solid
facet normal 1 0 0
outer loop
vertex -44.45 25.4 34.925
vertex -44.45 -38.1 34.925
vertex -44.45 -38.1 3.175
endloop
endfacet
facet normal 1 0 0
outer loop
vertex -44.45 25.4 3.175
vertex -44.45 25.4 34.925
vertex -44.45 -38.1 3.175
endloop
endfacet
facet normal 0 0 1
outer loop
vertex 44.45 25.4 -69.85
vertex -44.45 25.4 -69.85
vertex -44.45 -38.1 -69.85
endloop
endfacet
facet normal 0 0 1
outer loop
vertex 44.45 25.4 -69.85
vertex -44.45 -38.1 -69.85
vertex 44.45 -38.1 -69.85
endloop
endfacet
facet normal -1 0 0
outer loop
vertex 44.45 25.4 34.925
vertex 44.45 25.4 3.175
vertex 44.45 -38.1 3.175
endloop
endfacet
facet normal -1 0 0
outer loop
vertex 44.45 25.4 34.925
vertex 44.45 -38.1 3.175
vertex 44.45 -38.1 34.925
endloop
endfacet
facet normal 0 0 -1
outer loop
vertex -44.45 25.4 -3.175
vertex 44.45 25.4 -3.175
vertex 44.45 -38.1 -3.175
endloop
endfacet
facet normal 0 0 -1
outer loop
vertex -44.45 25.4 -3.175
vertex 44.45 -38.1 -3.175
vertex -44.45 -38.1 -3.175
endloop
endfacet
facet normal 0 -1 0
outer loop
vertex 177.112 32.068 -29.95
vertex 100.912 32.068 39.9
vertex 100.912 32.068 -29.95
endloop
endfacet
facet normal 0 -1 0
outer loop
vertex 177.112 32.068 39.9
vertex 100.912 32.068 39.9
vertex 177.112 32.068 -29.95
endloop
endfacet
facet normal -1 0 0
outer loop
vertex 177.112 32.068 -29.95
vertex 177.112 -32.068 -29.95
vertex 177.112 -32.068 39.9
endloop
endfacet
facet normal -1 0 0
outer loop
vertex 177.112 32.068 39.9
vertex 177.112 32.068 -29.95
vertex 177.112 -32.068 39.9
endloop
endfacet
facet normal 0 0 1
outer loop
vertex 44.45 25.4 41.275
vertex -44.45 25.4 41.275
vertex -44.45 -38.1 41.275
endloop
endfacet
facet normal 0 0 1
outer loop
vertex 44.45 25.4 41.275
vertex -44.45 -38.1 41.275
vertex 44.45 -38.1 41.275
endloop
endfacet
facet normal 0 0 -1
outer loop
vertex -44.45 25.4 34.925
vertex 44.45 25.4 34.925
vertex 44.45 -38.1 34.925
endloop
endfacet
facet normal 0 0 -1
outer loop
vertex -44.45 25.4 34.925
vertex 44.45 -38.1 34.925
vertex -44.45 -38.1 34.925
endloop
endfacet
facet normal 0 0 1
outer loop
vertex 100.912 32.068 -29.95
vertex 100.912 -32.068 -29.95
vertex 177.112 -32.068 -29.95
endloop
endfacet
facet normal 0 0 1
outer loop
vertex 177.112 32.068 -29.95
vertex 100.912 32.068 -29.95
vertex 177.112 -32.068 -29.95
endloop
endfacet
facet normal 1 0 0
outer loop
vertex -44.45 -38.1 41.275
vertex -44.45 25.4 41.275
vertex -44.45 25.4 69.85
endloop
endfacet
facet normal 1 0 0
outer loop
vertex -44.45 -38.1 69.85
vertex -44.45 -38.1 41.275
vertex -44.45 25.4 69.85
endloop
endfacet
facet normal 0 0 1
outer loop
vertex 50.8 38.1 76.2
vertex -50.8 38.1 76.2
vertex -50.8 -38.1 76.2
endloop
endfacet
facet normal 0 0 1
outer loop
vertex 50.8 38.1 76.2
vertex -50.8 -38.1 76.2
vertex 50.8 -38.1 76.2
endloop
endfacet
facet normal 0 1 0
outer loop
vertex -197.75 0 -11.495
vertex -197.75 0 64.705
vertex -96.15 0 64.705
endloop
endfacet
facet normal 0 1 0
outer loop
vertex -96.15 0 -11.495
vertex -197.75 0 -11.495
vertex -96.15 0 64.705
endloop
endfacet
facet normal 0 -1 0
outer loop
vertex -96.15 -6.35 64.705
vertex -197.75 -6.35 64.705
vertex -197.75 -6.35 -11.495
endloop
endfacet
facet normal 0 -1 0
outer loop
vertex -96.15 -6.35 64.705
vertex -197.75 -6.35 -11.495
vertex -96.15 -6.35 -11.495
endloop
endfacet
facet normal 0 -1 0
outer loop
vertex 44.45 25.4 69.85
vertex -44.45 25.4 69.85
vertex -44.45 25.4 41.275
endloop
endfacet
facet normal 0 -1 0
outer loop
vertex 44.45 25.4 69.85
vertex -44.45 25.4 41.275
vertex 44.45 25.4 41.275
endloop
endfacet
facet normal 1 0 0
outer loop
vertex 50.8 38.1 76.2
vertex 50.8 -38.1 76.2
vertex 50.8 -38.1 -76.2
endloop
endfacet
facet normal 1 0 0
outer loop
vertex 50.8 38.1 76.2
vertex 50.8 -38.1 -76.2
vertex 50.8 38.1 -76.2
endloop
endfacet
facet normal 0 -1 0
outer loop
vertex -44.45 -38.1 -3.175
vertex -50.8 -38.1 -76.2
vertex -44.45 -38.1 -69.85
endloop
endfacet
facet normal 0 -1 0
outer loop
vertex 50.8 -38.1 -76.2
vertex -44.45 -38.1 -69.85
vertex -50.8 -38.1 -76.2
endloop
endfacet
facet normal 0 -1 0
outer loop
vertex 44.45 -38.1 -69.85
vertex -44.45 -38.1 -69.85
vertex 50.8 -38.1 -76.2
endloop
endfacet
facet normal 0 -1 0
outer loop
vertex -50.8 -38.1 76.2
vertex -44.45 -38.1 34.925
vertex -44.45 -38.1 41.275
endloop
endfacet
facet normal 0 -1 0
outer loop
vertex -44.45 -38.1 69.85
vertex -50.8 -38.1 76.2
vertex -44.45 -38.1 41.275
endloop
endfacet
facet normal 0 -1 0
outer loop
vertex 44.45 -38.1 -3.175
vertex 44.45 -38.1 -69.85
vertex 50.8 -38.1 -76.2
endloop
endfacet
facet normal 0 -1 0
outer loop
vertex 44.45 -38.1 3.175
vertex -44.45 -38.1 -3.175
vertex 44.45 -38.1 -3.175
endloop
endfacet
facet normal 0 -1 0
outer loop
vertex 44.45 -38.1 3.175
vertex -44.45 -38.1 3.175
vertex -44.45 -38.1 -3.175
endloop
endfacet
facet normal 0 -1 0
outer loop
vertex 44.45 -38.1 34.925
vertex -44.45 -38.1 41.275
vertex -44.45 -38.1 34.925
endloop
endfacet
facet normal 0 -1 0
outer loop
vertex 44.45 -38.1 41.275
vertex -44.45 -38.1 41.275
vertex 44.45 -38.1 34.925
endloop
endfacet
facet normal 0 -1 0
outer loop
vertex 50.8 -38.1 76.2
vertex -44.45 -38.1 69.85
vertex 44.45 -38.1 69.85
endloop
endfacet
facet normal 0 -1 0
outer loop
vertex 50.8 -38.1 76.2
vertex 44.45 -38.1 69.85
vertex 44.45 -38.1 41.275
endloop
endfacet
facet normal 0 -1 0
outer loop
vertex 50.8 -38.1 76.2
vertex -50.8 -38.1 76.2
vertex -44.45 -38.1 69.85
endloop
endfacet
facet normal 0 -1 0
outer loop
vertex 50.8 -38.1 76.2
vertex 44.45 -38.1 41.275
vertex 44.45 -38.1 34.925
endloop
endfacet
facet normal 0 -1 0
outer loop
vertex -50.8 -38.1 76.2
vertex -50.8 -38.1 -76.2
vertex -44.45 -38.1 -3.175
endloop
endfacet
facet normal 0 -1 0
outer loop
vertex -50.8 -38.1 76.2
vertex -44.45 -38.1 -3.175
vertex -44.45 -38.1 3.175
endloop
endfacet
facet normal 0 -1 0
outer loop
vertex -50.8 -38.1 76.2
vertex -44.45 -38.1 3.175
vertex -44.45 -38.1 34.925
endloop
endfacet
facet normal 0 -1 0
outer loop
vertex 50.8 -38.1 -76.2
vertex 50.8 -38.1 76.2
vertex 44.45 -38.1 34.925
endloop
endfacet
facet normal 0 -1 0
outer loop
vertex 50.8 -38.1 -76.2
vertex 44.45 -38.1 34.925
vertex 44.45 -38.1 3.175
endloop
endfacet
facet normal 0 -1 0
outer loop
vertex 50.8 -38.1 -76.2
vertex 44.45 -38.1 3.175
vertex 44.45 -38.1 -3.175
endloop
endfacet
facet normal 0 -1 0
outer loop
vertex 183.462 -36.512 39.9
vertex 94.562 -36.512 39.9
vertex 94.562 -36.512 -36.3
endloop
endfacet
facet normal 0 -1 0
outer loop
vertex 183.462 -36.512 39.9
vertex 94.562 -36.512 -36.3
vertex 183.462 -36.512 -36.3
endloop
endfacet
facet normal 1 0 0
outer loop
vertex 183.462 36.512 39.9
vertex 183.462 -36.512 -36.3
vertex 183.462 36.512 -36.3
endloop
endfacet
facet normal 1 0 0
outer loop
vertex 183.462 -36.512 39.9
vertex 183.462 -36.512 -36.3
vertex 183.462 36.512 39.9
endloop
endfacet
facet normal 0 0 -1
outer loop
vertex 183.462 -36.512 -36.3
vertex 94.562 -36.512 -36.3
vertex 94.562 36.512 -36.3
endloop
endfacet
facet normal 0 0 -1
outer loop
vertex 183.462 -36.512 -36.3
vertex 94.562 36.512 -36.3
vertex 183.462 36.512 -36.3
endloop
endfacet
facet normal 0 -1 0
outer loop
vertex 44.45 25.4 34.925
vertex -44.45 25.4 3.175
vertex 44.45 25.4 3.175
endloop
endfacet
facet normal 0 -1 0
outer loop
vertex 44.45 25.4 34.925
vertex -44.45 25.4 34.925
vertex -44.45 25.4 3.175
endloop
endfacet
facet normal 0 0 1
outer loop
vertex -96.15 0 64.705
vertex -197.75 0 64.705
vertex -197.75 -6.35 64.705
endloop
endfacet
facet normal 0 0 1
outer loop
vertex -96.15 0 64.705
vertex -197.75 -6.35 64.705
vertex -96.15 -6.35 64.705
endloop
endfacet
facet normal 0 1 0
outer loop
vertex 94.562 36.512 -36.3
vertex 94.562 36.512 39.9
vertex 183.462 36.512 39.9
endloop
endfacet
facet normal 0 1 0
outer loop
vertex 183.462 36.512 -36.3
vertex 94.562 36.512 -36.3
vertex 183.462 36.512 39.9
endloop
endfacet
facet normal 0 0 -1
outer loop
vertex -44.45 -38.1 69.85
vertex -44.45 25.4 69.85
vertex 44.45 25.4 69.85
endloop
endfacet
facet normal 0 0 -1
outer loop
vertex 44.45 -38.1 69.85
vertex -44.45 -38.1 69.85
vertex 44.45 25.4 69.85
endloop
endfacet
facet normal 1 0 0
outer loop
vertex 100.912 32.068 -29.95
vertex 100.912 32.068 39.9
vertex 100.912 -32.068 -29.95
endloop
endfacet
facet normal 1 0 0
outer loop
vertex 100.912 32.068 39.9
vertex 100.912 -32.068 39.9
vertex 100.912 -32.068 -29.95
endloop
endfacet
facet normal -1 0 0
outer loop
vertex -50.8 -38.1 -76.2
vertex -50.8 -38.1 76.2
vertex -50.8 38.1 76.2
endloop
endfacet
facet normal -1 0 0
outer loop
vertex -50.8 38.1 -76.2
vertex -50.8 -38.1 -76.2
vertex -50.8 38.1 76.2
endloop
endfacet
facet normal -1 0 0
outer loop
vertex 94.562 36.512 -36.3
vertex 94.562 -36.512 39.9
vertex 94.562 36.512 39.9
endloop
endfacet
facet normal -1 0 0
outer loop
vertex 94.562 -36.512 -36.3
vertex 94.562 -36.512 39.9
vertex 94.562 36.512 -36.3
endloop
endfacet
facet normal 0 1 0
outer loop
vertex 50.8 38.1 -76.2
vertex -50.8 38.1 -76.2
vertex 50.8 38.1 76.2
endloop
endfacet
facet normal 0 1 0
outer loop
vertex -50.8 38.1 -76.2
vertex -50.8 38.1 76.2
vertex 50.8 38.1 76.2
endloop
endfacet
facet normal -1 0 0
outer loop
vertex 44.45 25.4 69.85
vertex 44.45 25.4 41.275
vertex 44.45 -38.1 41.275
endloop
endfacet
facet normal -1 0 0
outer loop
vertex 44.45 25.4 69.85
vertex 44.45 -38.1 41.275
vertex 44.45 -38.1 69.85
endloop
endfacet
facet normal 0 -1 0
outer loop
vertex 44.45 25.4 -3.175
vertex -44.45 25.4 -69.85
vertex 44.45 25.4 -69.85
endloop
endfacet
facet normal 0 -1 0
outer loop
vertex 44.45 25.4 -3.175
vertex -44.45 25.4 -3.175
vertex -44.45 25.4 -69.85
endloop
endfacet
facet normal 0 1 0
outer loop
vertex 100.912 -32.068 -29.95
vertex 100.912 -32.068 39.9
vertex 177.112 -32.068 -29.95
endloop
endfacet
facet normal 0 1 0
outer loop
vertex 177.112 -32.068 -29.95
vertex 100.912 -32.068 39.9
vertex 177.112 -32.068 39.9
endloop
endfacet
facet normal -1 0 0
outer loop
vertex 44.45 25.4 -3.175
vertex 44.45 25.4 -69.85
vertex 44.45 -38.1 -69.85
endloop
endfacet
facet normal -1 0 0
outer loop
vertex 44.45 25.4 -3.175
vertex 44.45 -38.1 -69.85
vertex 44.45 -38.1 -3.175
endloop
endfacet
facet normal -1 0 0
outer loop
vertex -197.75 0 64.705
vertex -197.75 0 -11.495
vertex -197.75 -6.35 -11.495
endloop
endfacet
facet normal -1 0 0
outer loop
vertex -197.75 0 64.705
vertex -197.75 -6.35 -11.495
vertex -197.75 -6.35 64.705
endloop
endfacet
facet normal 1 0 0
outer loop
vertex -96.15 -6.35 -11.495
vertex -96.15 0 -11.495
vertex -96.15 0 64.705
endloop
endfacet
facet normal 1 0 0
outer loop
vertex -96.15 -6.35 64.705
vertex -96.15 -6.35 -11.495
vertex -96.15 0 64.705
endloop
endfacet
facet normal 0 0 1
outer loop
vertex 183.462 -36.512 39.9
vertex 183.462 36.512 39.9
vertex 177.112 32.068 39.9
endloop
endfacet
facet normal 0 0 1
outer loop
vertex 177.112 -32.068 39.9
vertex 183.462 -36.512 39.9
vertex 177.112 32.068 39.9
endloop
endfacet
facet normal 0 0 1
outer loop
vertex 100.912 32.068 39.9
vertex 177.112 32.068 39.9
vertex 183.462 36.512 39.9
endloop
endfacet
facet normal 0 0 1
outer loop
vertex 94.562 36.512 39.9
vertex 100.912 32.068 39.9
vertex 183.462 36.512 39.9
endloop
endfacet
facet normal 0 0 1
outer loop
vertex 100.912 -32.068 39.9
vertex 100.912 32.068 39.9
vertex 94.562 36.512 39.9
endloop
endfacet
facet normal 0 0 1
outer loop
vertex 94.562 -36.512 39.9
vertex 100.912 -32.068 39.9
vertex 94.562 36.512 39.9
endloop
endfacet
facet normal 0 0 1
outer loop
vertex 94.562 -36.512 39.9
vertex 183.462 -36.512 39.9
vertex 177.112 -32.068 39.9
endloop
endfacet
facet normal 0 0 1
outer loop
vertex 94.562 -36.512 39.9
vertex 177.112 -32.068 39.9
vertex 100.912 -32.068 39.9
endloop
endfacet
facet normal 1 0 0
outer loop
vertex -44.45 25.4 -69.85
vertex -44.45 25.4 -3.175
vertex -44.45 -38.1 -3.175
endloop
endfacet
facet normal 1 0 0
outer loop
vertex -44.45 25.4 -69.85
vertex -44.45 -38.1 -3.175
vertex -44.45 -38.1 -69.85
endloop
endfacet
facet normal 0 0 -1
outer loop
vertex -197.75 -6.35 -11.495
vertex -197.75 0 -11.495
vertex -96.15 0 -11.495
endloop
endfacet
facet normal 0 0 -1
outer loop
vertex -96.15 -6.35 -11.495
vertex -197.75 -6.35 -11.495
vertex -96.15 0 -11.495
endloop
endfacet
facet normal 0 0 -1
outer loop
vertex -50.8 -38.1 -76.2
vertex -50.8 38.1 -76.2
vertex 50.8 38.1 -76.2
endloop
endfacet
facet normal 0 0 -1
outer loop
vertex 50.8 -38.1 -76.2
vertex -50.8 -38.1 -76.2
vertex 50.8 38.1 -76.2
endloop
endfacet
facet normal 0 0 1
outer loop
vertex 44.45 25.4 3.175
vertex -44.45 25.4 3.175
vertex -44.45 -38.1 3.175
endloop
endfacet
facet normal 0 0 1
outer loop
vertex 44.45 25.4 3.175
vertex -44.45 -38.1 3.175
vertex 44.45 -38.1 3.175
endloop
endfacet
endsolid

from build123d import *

# Parameters (mm, degrees)
F0_W     = 101.6
F0_H     = 76.2
F1_DEPTH = 76.2
F2_W     = 88.9
F2_H     = 28.575
F2_W_2   = 44.45
F2_H_2   = 6.35
F3_DEPTH = 50.8
F4_DEPTH = 25.4
F2_W_3   = 101.6
F2_H_3   = 76.2
F5_DEPTH = 6.35
F2_W_4   = 38.1
F2_H_4   = 31.75
F2_W_5   = 6.35
F6_DEPTH = 36.5125
F7_DEPTH = 32.0675


with BuildPart() as f1:
    # F0 (on Top) → F1 (new body, symmetric)
    with BuildSketch(Plane.XY):
        Rectangle(F0_W, F0_H)
    extrude(amount=F1_DEPTH, both=True)

    # F2 (on Front) → F3 (cut)
    with BuildSketch(Plane.XZ):
        with Locations((0, 55.5625)):
            Rectangle(F2_W, F2_H)
        Polygon((0, -44.45), (-44.45, -44.45), (-44.45, -69.85), (44.45, -69.85), (44.45, -44.45), align=None)
        Polygon((-44.45, 3.175), (0, 3.175), (0, 19.05), (0, 34.925), (-44.45, 34.925), align=None)
        Polygon((0, 19.05), (0, 3.175), (44.45, 3.175), (44.45, 34.925), (0, 34.925), align=None)
        Polygon((44.45, -3.175), (-44.45, -3.175), (-44.45, -31.75), (0, -31.75), (44.45, -31.75), align=None)
        with Locations((22.225, -41.275)):
            Rectangle(F2_W_2, F2_H_2)
        with Locations((-22.225, -41.275)):
            Rectangle(F2_W_2, F2_H_2)
        with Locations((-22.225, -34.925)):
            Rectangle(F2_W_2, F2_H_2)
        with Locations((22.225, -34.925)):
            Rectangle(F2_W_2, F2_H_2)
    extrude(amount=F3_DEPTH, mode=Mode.SUBTRACT)

    # F4 (cut): faces of the model
    f4_faces = [f1.faces().sort_by_distance(p)[0] for p in [
        (0, 0, 55.5625),
        (0, 0, 19.05),
        (0, 0, -36.5125),
    ]]
    extrude(f4_faces, amount=-F4_DEPTH, mode=Mode.SUBTRACT)


with BuildPart() as f5:
    # F2 (on Front) → F5 (new body)
    with BuildSketch(Plane.XZ):
        with Locations((-146.9496594191, 26.6050021112)):
            Rectangle(F2_W_3, F2_H_3)
    extrude(amount=F5_DEPTH)


with BuildPart() as f6:
    # F2 (on Front) → F6 (new body, symmetric)
    with BuildSketch(Plane.XZ):
        Polygon((94.5624826312, 33.5501439989), (94.5624826312, -29.9498560011), (100.9124826312, -29.9498560011), (100.9124826312, 1.8001439989), (100.9124826312, 33.5501439989), align=None)
        with Locations((119.9624826312, 17.6751439989)):
            Rectangle(F2_W_4, F2_H_4)
        with Locations((158.0624826312, 17.6751439989)):
            Rectangle(F2_W_4, F2_H_4)
        Polygon((100.9124826312, 1.8001439989), (100.9124826312, -29.9498560011), (177.1124826312, -29.9498560011), (177.1124826312, 1.8001439989), (139.0124826312, 1.8001439989), align=None)
        Polygon((177.1124826312, -29.9498560011), (183.4624826312, -29.9498560011), (183.4624826312, 33.5501439989), (177.1124826312, 33.5501439989), (177.1124826312, 1.8001439989), align=None)
        with Locations((180.2874826312, 36.7251439989)):
            Rectangle(F2_W_5, F2_H_2)
        with Locations((158.0624826312, 36.7251439989)):
            Rectangle(F2_W_4, F2_H_2)
        with Locations((119.9624826312, 36.7251439989)):
            Rectangle(F2_W_4, F2_H_2)
        with Locations((97.7374826312, 36.7251439989)):
            Rectangle(F2_W_5, F2_H_2)
        with Locations((97.7374826312, -33.1248560011)):
            Rectangle(F2_W_5, F2_H_2)
        Polygon((100.9124826312, -29.9498560011), (100.9124826312, -36.2998560011), (183.4624826312, -36.2998560011), (183.4624826312, -29.9498560011), (177.1124826312, -29.9498560011), align=None)
    extrude(amount=F6_DEPTH, both=True)

    # F2 (on Front) → F7 (cut, symmetric)
    with BuildSketch(Plane.XZ):
        with Locations((119.9624826312, 36.7251439989)):
            Rectangle(F2_W_4, F2_H_2)
        with Locations((158.0624826312, 36.7251439989)):
            Rectangle(F2_W_4, F2_H_2)
        with Locations((158.0624826312, 17.6751439989)):
            Rectangle(F2_W_4, F2_H_4)
        with Locations((119.9624826312, 17.6751439989)):
            Rectangle(F2_W_4, F2_H_4)
        Polygon((100.9124826312, 1.8001439989), (100.9124826312, -29.9498560011), (177.1124826312, -29.9498560011), (177.1124826312, 1.8001439989), (139.0124826312, 1.8001439989), align=None)
    extrude(amount=F7_DEPTH, both=True, mode=Mode.SUBTRACT)


solid = Compound([f1.part, f5.part, f6.part])
